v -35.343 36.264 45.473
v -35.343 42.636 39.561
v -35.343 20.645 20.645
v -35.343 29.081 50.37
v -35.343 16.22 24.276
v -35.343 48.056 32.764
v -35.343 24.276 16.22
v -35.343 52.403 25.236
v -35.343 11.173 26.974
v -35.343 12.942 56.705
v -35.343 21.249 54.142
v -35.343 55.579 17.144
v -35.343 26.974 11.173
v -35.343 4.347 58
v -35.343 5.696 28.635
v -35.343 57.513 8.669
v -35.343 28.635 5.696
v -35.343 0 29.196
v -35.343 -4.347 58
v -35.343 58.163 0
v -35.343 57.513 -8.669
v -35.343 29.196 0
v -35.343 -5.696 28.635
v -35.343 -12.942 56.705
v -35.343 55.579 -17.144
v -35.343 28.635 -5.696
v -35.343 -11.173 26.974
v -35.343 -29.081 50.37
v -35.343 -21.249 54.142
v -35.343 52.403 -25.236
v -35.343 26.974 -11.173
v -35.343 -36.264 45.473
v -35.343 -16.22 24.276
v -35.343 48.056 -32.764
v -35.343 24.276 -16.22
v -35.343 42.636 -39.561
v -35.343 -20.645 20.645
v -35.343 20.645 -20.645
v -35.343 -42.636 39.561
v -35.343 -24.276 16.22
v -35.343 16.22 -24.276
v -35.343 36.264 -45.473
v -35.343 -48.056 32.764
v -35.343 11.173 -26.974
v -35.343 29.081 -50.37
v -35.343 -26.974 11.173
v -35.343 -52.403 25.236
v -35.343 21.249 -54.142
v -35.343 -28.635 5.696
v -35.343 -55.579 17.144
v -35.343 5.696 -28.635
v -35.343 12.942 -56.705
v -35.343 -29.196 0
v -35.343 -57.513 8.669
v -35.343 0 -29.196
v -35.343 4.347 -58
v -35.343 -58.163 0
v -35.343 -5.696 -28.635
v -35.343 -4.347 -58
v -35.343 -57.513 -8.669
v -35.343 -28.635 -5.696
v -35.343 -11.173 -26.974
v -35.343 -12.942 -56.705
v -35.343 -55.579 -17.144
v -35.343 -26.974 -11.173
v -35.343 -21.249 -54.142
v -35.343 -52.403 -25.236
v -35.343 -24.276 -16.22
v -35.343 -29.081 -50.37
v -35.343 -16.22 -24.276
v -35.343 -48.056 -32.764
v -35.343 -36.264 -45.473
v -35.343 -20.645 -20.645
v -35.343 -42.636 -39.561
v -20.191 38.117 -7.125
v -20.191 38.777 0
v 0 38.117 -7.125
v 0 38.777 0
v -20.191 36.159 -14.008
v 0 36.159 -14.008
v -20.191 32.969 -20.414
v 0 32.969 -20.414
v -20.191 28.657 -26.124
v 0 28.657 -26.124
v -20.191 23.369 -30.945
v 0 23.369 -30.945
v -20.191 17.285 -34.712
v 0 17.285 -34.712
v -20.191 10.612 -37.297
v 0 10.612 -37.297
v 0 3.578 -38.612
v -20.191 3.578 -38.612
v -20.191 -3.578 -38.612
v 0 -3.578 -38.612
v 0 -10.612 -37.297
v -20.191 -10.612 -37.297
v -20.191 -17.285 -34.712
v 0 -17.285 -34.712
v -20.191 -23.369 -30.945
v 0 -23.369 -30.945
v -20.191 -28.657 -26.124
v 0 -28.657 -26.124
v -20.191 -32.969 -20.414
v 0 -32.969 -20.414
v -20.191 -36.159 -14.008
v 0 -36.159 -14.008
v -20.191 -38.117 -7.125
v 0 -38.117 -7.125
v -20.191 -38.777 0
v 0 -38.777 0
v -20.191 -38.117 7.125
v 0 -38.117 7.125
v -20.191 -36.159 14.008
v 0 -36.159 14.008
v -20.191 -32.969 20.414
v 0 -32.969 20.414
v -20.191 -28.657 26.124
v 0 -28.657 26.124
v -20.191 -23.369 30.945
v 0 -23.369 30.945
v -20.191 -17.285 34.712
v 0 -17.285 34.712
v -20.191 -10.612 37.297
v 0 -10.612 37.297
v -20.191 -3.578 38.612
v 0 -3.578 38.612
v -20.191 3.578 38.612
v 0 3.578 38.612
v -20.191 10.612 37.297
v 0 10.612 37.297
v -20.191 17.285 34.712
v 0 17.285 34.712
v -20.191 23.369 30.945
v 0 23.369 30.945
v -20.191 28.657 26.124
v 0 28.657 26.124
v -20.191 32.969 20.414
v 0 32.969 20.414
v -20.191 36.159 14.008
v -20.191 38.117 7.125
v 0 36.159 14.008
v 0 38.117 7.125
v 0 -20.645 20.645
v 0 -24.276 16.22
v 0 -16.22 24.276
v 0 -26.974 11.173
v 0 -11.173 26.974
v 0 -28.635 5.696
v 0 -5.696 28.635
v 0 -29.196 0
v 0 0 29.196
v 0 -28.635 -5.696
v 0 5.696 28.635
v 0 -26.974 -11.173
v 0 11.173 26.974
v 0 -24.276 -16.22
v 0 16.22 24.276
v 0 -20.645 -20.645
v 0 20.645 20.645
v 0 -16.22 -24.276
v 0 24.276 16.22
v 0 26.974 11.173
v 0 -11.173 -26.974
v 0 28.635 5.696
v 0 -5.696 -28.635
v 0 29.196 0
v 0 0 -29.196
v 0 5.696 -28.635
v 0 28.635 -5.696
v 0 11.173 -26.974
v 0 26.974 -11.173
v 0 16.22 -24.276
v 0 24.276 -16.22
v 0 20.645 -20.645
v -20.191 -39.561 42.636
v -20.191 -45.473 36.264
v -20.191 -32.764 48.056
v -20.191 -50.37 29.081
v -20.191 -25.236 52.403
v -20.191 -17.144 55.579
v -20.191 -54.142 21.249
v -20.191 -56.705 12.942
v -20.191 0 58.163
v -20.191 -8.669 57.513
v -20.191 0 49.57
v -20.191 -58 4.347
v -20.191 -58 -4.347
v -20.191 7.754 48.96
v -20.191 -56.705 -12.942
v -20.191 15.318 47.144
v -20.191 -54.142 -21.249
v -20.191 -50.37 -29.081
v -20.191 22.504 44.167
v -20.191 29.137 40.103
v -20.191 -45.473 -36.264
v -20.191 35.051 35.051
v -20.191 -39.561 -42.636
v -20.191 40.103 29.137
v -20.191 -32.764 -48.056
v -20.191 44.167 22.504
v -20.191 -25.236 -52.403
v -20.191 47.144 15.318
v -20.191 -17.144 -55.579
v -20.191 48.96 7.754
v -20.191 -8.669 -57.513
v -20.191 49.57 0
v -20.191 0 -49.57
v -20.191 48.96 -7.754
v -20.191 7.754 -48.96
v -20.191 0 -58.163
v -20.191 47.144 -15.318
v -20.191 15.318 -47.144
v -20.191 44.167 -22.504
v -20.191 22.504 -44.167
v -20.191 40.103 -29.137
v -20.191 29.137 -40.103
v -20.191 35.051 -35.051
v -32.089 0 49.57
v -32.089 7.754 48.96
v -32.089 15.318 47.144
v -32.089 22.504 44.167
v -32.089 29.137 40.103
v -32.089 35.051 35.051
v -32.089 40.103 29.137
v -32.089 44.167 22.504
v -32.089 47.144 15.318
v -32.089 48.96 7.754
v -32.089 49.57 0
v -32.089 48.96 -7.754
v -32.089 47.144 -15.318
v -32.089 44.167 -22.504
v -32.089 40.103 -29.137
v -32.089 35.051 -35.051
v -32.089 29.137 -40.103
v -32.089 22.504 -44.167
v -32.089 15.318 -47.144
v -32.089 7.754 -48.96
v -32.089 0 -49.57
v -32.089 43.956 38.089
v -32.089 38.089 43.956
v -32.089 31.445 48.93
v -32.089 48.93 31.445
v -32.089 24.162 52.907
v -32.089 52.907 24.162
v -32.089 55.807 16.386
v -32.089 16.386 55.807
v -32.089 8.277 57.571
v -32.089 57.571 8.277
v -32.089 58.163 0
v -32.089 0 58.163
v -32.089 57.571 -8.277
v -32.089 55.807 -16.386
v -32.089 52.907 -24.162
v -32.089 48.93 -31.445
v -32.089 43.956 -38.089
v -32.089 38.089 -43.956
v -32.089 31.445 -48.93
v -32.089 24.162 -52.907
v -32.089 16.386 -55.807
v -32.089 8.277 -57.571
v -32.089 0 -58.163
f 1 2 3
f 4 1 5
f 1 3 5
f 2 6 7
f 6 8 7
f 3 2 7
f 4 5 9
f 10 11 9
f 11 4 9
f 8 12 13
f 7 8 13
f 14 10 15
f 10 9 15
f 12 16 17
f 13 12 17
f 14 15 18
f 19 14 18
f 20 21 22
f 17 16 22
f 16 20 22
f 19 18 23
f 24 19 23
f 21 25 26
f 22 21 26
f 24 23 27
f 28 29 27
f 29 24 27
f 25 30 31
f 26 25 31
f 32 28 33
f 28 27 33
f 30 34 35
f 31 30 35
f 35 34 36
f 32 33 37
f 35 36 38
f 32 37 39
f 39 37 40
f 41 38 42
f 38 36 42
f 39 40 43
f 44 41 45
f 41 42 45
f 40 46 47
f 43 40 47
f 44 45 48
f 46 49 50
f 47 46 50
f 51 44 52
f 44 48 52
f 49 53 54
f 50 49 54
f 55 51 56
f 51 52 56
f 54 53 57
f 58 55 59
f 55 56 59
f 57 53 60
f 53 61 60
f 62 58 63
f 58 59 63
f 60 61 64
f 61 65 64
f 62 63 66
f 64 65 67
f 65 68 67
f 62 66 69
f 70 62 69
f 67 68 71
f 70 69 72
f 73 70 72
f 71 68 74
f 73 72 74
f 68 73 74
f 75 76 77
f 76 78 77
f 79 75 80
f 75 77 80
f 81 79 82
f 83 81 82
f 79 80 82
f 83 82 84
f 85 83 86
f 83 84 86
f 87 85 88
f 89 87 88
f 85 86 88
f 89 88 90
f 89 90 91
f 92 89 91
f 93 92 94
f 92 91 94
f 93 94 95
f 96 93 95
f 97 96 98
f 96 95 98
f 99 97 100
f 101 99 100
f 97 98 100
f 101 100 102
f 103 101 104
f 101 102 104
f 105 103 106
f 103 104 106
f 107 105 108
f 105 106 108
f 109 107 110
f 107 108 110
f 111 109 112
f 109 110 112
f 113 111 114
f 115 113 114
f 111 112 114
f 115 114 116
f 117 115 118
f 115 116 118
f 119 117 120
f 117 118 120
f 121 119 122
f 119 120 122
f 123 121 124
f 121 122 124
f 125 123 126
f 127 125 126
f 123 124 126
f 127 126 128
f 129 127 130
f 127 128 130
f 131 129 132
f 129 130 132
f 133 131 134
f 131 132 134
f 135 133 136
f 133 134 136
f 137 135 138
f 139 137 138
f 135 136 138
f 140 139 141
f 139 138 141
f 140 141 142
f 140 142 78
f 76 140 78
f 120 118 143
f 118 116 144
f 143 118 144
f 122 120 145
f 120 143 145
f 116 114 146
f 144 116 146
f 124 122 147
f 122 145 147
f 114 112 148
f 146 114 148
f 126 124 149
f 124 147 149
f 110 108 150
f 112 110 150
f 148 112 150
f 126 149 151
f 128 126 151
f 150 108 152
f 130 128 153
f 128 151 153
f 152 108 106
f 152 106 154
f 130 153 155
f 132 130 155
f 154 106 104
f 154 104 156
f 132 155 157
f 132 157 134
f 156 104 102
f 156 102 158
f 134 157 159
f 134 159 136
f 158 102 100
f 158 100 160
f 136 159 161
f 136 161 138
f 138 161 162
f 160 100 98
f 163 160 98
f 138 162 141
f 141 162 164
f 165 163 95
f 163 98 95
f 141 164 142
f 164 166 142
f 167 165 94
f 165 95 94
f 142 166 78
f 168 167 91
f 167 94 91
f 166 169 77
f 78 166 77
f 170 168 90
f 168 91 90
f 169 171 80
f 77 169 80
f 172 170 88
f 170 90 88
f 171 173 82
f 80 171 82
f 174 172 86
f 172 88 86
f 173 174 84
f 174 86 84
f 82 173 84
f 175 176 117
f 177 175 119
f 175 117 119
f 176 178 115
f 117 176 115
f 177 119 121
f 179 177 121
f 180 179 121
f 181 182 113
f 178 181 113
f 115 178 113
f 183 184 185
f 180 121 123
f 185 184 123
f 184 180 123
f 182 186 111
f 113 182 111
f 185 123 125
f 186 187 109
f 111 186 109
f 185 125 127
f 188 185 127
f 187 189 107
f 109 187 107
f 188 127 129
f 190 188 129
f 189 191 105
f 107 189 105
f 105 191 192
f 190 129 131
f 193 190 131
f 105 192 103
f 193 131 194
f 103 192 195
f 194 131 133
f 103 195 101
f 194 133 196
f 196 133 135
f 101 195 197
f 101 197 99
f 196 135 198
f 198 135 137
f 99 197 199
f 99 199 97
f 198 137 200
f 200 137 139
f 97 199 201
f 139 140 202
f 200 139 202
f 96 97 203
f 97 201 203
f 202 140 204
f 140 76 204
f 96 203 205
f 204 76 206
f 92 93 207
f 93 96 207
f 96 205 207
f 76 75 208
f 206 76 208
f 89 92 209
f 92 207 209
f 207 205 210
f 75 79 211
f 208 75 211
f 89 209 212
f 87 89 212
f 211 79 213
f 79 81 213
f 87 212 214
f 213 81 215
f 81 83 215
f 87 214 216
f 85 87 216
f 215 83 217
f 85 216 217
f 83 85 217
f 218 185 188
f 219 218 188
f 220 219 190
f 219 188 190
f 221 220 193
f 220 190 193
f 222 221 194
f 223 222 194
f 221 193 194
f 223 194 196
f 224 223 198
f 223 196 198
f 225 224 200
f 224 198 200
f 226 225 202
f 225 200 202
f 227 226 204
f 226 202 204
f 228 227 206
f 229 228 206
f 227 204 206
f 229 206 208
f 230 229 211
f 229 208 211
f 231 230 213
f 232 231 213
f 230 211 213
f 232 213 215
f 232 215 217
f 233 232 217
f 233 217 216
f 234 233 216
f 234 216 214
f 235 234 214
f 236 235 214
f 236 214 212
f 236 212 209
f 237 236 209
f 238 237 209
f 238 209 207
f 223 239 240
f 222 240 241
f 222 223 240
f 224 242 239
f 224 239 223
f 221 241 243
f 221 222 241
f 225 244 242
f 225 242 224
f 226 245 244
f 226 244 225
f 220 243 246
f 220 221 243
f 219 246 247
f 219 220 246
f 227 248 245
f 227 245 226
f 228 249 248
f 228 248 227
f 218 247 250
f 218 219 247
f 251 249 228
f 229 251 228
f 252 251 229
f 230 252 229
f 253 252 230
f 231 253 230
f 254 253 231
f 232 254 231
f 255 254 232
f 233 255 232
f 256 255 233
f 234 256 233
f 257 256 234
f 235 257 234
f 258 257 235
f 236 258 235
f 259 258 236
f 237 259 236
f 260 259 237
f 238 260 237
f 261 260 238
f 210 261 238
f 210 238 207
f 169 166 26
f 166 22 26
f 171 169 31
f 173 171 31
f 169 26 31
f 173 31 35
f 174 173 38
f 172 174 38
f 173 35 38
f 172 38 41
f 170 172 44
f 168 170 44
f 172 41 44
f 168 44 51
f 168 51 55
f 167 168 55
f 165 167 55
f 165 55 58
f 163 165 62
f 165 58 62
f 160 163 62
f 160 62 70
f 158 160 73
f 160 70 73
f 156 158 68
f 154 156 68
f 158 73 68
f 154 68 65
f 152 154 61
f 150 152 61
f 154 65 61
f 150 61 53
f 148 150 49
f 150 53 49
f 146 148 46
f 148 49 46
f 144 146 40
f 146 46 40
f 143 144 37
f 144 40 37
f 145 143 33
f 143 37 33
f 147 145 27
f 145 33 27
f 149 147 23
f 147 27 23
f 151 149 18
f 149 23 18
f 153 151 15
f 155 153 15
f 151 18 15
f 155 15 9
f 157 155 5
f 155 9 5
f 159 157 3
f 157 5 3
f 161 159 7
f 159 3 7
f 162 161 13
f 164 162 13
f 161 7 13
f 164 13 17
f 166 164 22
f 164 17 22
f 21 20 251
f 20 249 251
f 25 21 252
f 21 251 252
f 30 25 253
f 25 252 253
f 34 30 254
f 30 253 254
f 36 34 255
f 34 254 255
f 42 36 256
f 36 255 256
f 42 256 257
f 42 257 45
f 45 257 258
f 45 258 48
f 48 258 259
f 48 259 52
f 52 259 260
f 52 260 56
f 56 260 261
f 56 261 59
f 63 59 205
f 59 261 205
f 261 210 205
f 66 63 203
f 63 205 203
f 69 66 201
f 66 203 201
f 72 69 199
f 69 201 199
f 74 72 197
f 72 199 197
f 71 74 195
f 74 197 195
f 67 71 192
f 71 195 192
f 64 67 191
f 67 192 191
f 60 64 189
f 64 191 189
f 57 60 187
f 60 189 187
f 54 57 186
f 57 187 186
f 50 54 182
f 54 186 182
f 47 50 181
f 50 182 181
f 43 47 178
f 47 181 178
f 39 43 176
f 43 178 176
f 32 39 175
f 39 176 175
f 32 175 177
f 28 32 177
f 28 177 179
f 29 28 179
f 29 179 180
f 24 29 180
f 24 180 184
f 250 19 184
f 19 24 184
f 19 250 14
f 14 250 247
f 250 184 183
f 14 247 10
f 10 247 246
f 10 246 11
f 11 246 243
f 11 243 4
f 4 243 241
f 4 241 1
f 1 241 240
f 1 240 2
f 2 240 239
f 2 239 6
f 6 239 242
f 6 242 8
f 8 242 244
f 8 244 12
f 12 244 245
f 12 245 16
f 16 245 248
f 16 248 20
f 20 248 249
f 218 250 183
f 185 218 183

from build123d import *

# Parameters (mm, degrees)
IZIM2_W           = 24.151632934
IZIM2_H           = 17.006179403
KES_D_ND_R1_ANGLE = 180


with BuildPart() as part:
    # Çizim1 → Döndür1 (revolve)
    with BuildSketch(Plane.XY):
        Polygon((0, 29.195939483), (-35.343100252, 29.195939483), (-35.343100252, 58.1627654), (-20.19122208, 58.1627654), (-20.19122208, 38.777274209), (0, 38.777274209), align=None)
    revolve(axis=Axis((0, 0, 0), (-1, 0, 0)))

    # Çizim2 → Kes-Döndür1 (revolve, symmetric, cut)
    with BuildSketch(Plane.XY) as kes_d_nd_r1_sk:
        with Locations((-20.013486139, 58.073305733)):
            Rectangle(IZIM2_W, IZIM2_H)
    revolve(axis=Axis((0, 0, 0), (-1, 0, 0)), revolution_arc=KES_D_ND_R1_ANGLE / 2, mode=Mode.SUBTRACT)
    revolve(kes_d_nd_r1_sk.sketch, axis=Axis((0, 0, 0), (1, 0, 0)), revolution_arc=KES_D_ND_R1_ANGLE / 2, mode=Mode.SUBTRACT)


solid = part.part
